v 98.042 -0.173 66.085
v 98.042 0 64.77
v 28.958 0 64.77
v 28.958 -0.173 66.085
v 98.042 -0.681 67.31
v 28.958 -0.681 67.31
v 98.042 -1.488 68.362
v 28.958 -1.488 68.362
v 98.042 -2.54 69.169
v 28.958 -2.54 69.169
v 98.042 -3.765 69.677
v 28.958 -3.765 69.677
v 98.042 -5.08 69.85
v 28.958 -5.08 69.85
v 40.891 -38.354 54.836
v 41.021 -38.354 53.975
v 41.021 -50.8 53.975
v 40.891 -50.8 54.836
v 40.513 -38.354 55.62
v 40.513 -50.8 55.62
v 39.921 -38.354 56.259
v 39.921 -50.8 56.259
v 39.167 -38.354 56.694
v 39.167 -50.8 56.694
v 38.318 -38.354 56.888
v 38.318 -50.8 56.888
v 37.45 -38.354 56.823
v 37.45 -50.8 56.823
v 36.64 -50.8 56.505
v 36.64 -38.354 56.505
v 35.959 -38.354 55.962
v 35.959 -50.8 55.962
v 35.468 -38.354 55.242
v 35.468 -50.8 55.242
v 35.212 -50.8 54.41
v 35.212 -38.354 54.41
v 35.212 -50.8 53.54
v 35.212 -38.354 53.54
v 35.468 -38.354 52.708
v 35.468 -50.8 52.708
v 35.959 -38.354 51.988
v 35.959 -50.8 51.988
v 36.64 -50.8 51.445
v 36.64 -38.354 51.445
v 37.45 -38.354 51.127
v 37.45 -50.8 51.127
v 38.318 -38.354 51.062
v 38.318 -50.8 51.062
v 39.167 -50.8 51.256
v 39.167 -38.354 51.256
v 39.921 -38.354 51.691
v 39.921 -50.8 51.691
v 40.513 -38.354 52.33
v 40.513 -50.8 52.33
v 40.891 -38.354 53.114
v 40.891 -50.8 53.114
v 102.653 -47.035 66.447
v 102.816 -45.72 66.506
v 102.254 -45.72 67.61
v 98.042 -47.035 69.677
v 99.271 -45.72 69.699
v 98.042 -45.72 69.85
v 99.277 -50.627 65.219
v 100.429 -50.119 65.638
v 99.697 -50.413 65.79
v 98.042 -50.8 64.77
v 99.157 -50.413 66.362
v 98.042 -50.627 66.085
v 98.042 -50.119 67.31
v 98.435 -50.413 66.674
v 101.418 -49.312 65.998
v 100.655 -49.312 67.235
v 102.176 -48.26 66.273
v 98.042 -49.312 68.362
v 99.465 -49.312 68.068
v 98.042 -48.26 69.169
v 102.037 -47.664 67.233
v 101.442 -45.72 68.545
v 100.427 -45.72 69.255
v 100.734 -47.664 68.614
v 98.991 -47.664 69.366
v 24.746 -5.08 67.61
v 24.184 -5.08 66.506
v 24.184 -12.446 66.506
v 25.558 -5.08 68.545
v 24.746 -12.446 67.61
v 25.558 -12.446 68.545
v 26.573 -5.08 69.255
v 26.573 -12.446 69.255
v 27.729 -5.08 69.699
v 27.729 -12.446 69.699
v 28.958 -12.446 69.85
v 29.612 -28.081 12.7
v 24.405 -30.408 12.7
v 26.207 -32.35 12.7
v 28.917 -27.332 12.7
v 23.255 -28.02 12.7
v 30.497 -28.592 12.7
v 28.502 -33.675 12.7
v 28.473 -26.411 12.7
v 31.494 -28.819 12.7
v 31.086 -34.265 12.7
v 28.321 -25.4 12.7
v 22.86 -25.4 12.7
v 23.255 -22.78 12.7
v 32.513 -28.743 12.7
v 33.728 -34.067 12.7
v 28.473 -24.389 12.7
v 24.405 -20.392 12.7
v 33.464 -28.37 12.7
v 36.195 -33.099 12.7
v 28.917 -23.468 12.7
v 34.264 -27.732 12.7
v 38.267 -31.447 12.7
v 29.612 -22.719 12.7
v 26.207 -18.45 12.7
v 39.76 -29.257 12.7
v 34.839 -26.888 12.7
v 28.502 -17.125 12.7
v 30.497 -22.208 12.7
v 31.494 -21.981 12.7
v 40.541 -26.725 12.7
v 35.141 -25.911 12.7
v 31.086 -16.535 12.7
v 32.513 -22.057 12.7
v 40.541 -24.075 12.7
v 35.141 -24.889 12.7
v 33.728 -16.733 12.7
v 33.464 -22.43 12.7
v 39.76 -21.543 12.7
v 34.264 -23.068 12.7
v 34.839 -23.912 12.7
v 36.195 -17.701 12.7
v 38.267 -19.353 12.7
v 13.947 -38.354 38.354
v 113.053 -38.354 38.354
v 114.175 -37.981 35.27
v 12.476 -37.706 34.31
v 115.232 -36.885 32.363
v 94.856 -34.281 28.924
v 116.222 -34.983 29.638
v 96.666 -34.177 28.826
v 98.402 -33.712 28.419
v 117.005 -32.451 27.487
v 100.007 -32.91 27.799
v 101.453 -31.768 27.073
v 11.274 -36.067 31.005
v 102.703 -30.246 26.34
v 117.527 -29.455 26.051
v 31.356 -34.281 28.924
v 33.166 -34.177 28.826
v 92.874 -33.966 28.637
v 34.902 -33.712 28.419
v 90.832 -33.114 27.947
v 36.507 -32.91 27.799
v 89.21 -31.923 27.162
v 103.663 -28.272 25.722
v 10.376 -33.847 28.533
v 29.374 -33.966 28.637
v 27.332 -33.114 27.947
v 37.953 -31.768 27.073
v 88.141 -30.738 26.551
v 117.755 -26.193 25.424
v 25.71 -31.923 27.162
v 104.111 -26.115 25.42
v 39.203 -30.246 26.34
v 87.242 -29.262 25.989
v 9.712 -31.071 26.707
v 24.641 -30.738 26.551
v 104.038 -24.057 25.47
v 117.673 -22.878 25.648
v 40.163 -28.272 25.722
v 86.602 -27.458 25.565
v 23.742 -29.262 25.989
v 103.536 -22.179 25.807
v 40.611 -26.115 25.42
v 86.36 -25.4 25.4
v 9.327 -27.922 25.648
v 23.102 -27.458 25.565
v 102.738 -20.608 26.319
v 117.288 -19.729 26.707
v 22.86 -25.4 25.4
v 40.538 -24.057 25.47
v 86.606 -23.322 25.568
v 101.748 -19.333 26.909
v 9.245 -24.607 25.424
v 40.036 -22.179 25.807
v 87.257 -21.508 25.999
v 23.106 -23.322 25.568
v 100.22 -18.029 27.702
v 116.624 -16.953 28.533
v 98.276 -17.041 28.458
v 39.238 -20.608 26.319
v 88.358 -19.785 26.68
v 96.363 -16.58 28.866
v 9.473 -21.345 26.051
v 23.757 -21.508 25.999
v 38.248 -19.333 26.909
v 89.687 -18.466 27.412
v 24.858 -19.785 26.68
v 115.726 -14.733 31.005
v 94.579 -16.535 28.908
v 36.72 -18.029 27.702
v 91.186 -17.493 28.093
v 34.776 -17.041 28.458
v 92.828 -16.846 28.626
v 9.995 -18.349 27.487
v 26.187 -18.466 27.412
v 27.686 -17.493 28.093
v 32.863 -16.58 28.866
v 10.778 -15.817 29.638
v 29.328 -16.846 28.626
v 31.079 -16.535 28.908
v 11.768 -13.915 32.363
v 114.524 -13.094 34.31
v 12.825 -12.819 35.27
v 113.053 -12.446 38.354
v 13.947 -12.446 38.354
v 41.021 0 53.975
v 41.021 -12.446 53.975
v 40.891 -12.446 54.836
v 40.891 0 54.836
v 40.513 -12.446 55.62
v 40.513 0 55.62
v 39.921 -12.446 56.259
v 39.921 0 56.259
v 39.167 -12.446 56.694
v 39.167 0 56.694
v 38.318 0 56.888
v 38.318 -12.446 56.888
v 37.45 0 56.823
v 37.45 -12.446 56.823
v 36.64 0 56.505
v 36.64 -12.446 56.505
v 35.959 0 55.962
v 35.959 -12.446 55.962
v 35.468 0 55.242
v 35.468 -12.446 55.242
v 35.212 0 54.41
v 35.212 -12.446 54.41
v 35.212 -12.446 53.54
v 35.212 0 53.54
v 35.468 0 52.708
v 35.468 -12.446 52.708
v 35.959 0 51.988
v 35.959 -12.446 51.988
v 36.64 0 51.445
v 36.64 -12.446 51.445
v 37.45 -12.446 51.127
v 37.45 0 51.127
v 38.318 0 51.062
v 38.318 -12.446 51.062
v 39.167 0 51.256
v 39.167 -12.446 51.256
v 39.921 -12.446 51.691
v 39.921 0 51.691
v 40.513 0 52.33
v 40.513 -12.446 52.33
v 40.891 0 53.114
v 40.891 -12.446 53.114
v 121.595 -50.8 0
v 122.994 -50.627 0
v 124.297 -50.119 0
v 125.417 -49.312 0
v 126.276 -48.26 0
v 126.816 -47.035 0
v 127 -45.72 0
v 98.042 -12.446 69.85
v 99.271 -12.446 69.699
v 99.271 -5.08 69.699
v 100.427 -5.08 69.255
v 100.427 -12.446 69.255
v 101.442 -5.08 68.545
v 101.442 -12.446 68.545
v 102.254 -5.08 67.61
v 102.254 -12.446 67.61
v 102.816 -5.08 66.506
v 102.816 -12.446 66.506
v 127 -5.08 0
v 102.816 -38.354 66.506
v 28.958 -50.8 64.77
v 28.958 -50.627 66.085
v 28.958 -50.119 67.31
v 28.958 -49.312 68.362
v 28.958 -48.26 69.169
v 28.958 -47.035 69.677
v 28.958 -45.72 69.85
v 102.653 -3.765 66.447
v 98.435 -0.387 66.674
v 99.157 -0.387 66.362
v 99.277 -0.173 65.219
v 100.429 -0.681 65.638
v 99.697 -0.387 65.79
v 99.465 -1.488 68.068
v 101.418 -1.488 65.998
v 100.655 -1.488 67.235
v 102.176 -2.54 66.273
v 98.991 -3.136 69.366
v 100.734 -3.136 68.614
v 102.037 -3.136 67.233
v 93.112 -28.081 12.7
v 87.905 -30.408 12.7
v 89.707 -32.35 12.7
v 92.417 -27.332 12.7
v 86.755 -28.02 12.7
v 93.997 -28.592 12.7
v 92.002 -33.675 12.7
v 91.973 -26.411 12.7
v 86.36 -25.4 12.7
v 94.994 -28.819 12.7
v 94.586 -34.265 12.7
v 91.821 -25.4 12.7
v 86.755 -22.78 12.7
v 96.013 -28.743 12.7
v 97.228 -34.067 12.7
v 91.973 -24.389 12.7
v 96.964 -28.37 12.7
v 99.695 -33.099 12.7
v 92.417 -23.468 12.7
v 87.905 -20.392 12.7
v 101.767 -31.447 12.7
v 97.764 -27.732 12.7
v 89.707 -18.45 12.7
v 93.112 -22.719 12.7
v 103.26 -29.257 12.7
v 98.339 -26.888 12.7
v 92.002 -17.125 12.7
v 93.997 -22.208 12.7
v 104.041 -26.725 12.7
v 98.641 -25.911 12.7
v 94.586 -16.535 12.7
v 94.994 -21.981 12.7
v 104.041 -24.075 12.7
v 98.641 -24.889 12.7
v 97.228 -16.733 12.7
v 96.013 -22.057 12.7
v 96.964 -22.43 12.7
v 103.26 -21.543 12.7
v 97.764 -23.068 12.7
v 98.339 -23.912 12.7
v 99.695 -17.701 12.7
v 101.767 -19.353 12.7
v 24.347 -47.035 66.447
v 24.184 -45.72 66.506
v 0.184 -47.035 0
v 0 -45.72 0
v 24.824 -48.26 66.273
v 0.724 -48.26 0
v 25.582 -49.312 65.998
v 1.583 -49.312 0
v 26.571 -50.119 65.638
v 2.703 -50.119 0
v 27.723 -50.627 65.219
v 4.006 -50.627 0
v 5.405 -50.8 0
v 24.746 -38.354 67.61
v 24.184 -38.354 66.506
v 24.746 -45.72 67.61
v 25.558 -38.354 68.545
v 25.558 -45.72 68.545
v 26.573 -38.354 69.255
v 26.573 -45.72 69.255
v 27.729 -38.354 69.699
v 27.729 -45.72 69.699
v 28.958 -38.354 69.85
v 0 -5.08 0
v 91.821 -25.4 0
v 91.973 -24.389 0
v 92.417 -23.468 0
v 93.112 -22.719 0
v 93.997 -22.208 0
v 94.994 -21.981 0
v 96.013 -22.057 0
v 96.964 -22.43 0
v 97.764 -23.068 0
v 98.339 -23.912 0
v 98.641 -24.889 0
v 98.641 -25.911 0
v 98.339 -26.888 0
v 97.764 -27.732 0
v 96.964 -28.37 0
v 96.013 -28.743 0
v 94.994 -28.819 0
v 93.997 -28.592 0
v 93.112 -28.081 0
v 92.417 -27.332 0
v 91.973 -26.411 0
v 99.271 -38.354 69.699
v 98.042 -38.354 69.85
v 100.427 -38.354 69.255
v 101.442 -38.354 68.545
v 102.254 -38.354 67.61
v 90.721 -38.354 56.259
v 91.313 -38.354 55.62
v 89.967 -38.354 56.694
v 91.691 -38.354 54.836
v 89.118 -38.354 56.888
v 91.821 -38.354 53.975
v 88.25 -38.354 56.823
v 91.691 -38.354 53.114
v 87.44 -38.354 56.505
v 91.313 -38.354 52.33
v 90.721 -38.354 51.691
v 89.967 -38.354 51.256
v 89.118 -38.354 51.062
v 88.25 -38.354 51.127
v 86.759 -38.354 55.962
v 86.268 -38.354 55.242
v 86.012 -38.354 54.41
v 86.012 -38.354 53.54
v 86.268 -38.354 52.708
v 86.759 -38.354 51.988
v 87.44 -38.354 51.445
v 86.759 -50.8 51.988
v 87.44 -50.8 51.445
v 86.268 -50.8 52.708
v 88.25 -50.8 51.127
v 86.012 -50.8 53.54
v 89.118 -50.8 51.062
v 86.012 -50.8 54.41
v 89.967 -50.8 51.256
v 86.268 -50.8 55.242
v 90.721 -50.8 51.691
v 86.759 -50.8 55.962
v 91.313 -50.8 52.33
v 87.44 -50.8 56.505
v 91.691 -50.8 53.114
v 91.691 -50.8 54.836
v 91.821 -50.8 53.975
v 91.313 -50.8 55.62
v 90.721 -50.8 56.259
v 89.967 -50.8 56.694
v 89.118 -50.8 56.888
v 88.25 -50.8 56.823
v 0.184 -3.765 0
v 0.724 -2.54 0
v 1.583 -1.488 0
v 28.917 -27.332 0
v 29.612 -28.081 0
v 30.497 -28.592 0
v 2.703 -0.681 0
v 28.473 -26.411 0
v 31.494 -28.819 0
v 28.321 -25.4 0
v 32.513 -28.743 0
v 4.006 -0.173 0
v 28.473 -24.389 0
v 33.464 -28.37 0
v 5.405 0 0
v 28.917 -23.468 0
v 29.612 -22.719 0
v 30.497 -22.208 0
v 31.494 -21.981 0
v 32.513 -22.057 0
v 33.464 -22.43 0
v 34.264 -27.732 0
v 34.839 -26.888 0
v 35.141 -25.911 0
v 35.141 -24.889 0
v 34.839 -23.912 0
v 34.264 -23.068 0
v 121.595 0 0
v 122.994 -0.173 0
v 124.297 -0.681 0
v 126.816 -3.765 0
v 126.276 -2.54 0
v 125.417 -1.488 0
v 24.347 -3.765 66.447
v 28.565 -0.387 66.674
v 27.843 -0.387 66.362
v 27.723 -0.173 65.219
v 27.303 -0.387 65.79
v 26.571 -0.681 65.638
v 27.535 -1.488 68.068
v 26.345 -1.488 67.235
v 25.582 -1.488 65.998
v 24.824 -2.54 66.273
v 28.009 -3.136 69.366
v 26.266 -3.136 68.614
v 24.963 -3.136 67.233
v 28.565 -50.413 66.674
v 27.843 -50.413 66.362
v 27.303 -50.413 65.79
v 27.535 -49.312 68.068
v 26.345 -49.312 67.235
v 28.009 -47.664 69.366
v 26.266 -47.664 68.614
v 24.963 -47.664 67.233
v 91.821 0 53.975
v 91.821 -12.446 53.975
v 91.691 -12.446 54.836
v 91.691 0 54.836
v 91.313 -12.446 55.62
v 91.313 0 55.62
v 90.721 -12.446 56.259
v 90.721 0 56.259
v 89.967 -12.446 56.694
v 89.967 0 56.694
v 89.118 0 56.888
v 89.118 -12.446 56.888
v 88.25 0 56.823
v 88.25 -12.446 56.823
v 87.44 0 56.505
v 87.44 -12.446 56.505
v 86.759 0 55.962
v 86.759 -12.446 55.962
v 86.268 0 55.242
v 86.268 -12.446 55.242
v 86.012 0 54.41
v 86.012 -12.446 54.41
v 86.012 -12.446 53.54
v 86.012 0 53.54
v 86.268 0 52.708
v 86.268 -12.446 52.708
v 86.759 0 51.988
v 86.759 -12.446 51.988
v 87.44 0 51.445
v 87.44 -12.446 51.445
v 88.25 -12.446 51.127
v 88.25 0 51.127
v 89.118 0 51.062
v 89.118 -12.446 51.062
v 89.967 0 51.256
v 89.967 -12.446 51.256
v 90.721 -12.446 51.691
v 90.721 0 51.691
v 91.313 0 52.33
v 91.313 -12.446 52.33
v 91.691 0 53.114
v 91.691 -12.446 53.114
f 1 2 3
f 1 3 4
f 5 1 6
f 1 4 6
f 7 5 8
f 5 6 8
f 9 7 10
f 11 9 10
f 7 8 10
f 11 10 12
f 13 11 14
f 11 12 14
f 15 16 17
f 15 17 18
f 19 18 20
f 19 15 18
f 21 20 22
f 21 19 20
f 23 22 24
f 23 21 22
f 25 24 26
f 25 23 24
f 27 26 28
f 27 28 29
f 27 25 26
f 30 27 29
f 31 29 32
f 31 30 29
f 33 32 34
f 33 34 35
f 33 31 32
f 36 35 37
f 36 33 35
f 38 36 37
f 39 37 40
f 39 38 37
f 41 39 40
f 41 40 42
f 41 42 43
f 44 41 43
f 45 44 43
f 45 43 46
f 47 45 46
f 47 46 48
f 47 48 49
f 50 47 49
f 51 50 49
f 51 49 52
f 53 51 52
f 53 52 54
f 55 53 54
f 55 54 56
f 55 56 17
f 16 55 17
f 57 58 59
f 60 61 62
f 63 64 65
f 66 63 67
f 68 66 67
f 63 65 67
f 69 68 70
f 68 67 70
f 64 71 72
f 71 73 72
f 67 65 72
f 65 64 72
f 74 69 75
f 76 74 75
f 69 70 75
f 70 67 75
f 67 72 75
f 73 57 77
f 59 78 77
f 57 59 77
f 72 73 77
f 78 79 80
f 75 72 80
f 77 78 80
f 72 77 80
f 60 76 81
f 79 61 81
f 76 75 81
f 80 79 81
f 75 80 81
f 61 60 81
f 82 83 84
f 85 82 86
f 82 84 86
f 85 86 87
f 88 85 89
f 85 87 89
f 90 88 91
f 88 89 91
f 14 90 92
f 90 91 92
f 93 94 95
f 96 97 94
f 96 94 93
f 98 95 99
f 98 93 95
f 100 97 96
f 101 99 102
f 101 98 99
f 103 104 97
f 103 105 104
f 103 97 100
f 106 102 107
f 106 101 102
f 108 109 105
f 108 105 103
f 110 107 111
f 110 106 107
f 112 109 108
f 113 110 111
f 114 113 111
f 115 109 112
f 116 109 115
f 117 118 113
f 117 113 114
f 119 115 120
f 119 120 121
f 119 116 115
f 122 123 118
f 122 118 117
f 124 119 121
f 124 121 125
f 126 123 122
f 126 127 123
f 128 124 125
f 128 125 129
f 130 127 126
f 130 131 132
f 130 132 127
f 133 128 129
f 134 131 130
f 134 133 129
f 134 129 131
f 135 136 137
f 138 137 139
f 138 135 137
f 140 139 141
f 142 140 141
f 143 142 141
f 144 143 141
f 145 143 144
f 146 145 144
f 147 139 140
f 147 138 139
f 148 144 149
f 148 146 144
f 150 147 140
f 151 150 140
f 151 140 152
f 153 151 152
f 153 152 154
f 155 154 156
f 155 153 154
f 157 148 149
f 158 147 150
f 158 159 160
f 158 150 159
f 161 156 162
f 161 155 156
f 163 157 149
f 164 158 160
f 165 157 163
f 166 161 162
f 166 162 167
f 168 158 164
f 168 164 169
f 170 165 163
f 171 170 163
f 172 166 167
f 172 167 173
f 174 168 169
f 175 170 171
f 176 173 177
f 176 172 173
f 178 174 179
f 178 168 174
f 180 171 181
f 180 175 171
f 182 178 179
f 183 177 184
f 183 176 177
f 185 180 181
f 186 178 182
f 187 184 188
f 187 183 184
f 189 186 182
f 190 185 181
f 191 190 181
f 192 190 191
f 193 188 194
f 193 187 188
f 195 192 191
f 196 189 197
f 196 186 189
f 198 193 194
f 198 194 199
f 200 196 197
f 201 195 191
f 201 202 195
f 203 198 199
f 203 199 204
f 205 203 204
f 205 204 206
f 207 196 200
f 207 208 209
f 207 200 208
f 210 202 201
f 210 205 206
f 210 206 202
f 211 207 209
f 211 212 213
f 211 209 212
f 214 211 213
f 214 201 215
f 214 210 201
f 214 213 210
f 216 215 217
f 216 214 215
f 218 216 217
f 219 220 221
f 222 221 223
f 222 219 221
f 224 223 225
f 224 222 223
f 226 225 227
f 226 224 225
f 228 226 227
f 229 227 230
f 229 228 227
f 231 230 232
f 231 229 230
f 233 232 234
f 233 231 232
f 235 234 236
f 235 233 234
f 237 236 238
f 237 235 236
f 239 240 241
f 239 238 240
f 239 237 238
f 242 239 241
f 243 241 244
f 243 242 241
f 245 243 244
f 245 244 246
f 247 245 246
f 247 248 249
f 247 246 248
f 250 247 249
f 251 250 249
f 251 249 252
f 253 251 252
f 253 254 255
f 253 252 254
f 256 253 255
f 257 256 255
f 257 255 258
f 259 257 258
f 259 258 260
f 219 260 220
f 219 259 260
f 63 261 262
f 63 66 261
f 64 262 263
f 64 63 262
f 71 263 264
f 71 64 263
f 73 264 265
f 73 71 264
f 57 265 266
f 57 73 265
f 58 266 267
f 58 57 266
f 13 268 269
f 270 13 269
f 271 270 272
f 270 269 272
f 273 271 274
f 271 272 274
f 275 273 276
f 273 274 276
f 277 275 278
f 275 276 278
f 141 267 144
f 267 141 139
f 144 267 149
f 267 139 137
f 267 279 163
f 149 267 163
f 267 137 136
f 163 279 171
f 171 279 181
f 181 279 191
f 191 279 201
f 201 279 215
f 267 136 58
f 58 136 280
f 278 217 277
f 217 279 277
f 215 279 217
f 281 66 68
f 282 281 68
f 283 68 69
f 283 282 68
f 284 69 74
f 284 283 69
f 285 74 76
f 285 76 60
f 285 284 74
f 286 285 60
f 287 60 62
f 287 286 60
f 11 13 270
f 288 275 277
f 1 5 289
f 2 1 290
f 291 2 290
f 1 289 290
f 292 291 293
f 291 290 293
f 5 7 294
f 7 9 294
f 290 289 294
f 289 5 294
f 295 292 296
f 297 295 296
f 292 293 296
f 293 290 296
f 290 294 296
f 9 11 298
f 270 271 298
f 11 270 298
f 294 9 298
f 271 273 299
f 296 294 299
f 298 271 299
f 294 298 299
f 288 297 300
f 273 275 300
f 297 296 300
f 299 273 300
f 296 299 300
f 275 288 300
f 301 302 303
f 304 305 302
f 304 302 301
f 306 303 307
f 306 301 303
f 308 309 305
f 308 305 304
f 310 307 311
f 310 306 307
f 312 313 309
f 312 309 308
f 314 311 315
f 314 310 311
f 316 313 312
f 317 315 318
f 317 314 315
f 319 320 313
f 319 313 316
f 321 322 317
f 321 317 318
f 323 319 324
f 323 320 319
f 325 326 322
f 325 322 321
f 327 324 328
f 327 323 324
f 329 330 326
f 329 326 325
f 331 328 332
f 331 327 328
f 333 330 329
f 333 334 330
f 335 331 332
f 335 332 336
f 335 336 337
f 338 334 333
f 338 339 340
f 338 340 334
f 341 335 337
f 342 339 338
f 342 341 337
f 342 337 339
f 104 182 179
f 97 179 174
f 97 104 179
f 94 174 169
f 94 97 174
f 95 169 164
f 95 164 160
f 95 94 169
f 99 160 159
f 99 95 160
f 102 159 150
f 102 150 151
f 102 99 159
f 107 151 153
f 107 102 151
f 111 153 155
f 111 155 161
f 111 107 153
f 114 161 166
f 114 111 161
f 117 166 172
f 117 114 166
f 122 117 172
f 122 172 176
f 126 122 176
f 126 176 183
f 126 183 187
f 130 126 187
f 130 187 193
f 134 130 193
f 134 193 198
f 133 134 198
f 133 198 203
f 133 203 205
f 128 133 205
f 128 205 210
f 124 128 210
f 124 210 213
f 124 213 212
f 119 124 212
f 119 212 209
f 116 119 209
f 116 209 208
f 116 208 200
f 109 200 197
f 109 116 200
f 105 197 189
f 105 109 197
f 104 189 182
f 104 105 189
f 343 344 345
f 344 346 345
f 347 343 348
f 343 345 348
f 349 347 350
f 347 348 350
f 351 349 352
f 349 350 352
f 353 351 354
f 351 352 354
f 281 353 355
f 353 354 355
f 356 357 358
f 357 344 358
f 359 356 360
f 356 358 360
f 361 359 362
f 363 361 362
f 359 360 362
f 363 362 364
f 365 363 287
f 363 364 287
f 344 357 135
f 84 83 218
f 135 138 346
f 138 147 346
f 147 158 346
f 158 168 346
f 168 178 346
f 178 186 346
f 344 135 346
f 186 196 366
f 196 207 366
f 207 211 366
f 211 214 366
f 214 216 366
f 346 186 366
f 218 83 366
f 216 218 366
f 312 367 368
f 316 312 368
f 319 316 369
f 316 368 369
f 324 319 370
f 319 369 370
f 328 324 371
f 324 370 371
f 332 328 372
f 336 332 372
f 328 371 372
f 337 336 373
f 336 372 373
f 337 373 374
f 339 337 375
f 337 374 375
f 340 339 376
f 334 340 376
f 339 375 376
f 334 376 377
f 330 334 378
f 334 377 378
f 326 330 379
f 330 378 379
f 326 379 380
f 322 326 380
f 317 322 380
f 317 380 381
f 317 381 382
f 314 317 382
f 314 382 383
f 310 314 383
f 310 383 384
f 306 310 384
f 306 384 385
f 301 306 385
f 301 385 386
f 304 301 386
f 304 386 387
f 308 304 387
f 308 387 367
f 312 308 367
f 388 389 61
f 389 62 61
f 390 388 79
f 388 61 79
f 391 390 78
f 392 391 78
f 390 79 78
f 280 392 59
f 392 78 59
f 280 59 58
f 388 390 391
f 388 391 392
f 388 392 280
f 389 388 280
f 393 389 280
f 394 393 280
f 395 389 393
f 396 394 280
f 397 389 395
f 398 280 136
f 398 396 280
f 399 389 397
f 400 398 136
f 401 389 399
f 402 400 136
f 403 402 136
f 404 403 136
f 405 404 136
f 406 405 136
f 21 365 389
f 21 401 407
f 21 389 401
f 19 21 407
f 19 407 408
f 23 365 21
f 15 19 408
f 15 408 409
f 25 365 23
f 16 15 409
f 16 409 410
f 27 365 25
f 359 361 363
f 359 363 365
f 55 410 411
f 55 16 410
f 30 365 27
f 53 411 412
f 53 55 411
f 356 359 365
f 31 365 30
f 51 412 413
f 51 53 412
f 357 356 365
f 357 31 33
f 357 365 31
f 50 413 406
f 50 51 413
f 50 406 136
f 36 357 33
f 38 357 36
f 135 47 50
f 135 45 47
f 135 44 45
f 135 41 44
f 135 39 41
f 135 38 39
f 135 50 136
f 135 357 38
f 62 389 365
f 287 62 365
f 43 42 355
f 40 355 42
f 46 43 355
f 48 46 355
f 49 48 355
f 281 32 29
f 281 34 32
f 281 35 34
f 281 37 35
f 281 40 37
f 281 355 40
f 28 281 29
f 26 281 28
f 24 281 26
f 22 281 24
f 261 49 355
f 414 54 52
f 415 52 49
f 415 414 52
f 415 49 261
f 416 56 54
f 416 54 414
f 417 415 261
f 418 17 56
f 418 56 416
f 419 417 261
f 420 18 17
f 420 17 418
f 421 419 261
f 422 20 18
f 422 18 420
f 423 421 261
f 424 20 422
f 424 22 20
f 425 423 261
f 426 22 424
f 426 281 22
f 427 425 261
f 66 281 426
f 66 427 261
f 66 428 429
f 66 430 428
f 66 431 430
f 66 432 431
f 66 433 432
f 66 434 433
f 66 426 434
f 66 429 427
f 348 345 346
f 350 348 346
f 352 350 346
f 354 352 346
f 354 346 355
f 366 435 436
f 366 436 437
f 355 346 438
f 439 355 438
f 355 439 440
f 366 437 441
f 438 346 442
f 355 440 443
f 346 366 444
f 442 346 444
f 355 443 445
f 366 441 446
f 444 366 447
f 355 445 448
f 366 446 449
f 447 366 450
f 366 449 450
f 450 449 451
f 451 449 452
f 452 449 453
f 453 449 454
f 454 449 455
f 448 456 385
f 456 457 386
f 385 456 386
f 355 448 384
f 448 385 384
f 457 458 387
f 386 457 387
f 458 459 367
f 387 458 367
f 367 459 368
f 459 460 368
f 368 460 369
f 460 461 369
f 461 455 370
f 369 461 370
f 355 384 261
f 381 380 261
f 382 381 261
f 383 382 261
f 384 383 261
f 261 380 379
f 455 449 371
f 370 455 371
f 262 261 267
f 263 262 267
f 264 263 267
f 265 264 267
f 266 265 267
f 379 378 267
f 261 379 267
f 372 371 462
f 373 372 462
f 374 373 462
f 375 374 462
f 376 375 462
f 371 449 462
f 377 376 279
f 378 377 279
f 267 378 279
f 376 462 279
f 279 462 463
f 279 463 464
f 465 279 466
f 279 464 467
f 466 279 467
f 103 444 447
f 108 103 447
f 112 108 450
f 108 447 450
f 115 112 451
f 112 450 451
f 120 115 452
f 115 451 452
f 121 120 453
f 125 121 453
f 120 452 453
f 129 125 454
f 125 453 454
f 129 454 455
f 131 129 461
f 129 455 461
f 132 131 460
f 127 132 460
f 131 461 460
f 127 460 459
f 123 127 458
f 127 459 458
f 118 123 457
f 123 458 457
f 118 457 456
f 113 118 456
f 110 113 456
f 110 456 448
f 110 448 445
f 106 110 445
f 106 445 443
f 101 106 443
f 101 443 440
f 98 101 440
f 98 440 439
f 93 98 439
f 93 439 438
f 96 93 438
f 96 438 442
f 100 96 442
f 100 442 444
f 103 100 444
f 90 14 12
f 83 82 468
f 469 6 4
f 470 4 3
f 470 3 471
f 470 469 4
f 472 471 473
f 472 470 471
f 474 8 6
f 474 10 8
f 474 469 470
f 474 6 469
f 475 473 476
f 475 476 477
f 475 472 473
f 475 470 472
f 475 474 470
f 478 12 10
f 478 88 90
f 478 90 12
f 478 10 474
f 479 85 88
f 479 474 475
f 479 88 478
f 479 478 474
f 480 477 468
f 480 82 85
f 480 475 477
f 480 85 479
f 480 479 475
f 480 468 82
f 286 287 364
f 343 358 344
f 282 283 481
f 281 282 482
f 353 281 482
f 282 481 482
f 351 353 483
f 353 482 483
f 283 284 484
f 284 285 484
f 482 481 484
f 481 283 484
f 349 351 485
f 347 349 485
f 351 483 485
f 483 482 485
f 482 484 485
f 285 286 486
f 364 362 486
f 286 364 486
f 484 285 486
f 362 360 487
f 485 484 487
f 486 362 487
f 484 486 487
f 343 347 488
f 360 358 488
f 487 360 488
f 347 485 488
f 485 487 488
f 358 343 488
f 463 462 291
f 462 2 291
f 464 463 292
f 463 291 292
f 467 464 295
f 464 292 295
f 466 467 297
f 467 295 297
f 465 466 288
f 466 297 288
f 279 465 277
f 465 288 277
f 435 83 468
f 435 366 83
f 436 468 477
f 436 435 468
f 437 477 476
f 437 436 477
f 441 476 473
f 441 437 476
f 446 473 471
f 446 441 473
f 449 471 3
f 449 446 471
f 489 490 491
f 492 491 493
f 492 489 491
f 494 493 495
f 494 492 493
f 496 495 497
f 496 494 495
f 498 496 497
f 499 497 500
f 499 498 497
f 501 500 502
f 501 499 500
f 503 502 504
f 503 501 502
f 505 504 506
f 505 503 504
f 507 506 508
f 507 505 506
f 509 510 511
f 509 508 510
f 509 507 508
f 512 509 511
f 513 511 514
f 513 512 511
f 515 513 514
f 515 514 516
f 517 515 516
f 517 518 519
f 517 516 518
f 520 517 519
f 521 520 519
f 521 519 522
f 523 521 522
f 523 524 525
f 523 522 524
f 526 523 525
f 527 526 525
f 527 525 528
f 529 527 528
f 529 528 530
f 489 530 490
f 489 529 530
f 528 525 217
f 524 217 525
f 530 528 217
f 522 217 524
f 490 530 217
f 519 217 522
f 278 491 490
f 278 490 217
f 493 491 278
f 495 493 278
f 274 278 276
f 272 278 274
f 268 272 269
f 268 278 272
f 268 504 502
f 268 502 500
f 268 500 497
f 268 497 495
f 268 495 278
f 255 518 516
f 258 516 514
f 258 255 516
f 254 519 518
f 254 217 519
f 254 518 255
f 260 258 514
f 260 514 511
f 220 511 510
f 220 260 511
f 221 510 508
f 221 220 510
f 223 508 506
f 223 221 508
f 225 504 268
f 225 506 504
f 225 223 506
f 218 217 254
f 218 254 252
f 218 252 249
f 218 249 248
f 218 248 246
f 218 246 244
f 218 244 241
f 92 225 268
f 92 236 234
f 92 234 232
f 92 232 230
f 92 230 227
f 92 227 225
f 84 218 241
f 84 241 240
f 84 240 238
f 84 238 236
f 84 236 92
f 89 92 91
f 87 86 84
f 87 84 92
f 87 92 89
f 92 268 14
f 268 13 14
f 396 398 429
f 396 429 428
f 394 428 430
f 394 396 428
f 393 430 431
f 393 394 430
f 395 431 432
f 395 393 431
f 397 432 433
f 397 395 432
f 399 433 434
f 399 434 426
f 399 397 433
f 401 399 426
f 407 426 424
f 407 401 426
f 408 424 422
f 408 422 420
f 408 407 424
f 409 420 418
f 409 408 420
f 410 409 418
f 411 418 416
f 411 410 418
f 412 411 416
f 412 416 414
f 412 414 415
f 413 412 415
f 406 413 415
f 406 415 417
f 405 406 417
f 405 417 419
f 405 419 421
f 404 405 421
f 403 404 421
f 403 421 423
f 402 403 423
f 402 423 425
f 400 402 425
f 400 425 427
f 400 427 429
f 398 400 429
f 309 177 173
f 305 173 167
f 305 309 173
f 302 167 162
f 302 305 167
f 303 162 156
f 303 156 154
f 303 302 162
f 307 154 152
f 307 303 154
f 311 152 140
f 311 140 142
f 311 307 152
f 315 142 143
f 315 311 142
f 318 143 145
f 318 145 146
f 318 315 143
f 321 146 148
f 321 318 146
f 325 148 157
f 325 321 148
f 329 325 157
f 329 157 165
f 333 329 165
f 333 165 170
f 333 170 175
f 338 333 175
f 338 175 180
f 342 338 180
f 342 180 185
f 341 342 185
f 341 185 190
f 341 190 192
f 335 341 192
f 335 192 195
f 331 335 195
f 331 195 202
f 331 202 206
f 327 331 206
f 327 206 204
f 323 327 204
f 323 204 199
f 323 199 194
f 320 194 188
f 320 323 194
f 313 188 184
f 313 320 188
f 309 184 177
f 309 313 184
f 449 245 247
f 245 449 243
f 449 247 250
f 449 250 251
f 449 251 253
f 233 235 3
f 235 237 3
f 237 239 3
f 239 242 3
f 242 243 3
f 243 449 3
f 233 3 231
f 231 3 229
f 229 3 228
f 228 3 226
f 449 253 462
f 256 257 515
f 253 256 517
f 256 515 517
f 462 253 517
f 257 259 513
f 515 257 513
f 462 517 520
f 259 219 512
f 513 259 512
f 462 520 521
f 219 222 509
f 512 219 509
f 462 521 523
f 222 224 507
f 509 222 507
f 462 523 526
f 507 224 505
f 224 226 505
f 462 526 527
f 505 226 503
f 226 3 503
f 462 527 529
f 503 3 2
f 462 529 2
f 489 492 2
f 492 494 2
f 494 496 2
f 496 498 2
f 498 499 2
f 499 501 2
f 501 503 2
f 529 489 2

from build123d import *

# Parameters (mm, degrees)
F0_R     = 2.921
F1_DEPTH = 50.8
F3_DEPTH = 278.638
F4_R     = 5.08
F6_DEPTH = 79.502
F9_DEPTH = 68.072


with BuildPart() as f1:
    # F0 (on Front) → F1 (new body)
    with BuildSketch(Plane.XZ):
        Polygon((25.4, 69.85), (0, 0), (127, 0), (101.6, 69.85), align=None)
        with Locations((38.1, 53.975)):
            Circle(F0_R, mode=Mode.SUBTRACT)
        with Locations((88.9, 53.975)):
            Circle(F0_R, mode=Mode.SUBTRACT)
    extrude(amount=F1_DEPTH)

    # F2 (on Right) → F3 (cut)
    with BuildSketch(Plane.YZ):
        with BuildLine():
            Line((-38.354, 86.910382), (-38.354, 38.354))
            ThreePointArc((-38.354, 38.354), (-25.4, 25.4), (-12.446, 38.354))
            Line((-12.446, 38.354), (-12.446, 88.236041))
            Line((-12.446, 88.236041), (-38.354, 86.910382))
        make_face()
    extrude(amount=F3_DEPTH, mode=Mode.SUBTRACT)

    # F4
    f4_edges = [f1.edges().sort_by_distance(p)[0] for p in [
        (114.3, -50.8, 34.925),
        (63.5, -50.8, 69.85),
        (12.7, -50.8, 34.925),
        (101.6, -44.577, 69.85),
        (101.6, -6.223, 69.85),
        (25.4, -44.577, 69.85),
        (25.4, -6.223, 69.85),
        (63.5, 0, 69.85),
        (114.3, 0, 34.925),
        (12.7, 0, 34.925),
    ]]
    fillet(f4_edges, radius=F4_R)

    # F5 (on face) → F6 (cut)
    with BuildSketch(Plane(origin=(0, 0, 0), x_dir=(1, 0, 0), z_dir=(0, 0, -1))):
        with BuildLine():
            Line((28.321, 25.4), (31.75, 25.4))
            Line((31.75, 25.4), (35.179, 25.4))
            ThreePointArc((35.179, 25.4), (31.75, 28.829), (28.321, 25.4))
        make_face()
        with BuildLine():
            Line((35.179, 25.4), (31.75, 25.4))
            Line((31.75, 25.4), (28.321, 25.4))
            ThreePointArc((28.321, 25.4), (31.75, 21.971), (35.179, 25.4))
        make_face()
        with BuildLine():
            ThreePointArc((98.679, 25.4), (95.25, 28.829), (91.821, 25.4))
            ThreePointArc((91.821, 25.4), (95.25, 21.971), (98.679, 25.4))
        make_face()
    extrude(amount=-F6_DEPTH, mode=Mode.SUBTRACT)

    # F8 (on offset) → F9 (cut)
    with BuildSketch(Plane.XY.offset(12.7)):
        with BuildLine():
            ThreePointArc((40.64, -25.4), (31.75, -16.51), (22.86, -25.4))
            Line((22.86, -25.4), (31.75, -25.4))
            Line((31.75, -25.4), (40.64, -25.4))
        make_face()
        with BuildLine():
            ThreePointArc((104.14, -25.4), (95.25, -16.51), (86.36, -25.4))
            ThreePointArc((86.36, -25.4), (95.25, -34.29), (104.14, -25.4))
        make_face()
        with BuildLine():
            Line((31.75, -25.4), (22.86, -25.4))
            ThreePointArc((22.86, -25.4), (31.75, -34.29), (40.64, -25.4))
            Line((40.64, -25.4), (31.75, -25.4))
        make_face()
    extrude(amount=F9_DEPTH, mode=Mode.SUBTRACT)


solid = f1.part
